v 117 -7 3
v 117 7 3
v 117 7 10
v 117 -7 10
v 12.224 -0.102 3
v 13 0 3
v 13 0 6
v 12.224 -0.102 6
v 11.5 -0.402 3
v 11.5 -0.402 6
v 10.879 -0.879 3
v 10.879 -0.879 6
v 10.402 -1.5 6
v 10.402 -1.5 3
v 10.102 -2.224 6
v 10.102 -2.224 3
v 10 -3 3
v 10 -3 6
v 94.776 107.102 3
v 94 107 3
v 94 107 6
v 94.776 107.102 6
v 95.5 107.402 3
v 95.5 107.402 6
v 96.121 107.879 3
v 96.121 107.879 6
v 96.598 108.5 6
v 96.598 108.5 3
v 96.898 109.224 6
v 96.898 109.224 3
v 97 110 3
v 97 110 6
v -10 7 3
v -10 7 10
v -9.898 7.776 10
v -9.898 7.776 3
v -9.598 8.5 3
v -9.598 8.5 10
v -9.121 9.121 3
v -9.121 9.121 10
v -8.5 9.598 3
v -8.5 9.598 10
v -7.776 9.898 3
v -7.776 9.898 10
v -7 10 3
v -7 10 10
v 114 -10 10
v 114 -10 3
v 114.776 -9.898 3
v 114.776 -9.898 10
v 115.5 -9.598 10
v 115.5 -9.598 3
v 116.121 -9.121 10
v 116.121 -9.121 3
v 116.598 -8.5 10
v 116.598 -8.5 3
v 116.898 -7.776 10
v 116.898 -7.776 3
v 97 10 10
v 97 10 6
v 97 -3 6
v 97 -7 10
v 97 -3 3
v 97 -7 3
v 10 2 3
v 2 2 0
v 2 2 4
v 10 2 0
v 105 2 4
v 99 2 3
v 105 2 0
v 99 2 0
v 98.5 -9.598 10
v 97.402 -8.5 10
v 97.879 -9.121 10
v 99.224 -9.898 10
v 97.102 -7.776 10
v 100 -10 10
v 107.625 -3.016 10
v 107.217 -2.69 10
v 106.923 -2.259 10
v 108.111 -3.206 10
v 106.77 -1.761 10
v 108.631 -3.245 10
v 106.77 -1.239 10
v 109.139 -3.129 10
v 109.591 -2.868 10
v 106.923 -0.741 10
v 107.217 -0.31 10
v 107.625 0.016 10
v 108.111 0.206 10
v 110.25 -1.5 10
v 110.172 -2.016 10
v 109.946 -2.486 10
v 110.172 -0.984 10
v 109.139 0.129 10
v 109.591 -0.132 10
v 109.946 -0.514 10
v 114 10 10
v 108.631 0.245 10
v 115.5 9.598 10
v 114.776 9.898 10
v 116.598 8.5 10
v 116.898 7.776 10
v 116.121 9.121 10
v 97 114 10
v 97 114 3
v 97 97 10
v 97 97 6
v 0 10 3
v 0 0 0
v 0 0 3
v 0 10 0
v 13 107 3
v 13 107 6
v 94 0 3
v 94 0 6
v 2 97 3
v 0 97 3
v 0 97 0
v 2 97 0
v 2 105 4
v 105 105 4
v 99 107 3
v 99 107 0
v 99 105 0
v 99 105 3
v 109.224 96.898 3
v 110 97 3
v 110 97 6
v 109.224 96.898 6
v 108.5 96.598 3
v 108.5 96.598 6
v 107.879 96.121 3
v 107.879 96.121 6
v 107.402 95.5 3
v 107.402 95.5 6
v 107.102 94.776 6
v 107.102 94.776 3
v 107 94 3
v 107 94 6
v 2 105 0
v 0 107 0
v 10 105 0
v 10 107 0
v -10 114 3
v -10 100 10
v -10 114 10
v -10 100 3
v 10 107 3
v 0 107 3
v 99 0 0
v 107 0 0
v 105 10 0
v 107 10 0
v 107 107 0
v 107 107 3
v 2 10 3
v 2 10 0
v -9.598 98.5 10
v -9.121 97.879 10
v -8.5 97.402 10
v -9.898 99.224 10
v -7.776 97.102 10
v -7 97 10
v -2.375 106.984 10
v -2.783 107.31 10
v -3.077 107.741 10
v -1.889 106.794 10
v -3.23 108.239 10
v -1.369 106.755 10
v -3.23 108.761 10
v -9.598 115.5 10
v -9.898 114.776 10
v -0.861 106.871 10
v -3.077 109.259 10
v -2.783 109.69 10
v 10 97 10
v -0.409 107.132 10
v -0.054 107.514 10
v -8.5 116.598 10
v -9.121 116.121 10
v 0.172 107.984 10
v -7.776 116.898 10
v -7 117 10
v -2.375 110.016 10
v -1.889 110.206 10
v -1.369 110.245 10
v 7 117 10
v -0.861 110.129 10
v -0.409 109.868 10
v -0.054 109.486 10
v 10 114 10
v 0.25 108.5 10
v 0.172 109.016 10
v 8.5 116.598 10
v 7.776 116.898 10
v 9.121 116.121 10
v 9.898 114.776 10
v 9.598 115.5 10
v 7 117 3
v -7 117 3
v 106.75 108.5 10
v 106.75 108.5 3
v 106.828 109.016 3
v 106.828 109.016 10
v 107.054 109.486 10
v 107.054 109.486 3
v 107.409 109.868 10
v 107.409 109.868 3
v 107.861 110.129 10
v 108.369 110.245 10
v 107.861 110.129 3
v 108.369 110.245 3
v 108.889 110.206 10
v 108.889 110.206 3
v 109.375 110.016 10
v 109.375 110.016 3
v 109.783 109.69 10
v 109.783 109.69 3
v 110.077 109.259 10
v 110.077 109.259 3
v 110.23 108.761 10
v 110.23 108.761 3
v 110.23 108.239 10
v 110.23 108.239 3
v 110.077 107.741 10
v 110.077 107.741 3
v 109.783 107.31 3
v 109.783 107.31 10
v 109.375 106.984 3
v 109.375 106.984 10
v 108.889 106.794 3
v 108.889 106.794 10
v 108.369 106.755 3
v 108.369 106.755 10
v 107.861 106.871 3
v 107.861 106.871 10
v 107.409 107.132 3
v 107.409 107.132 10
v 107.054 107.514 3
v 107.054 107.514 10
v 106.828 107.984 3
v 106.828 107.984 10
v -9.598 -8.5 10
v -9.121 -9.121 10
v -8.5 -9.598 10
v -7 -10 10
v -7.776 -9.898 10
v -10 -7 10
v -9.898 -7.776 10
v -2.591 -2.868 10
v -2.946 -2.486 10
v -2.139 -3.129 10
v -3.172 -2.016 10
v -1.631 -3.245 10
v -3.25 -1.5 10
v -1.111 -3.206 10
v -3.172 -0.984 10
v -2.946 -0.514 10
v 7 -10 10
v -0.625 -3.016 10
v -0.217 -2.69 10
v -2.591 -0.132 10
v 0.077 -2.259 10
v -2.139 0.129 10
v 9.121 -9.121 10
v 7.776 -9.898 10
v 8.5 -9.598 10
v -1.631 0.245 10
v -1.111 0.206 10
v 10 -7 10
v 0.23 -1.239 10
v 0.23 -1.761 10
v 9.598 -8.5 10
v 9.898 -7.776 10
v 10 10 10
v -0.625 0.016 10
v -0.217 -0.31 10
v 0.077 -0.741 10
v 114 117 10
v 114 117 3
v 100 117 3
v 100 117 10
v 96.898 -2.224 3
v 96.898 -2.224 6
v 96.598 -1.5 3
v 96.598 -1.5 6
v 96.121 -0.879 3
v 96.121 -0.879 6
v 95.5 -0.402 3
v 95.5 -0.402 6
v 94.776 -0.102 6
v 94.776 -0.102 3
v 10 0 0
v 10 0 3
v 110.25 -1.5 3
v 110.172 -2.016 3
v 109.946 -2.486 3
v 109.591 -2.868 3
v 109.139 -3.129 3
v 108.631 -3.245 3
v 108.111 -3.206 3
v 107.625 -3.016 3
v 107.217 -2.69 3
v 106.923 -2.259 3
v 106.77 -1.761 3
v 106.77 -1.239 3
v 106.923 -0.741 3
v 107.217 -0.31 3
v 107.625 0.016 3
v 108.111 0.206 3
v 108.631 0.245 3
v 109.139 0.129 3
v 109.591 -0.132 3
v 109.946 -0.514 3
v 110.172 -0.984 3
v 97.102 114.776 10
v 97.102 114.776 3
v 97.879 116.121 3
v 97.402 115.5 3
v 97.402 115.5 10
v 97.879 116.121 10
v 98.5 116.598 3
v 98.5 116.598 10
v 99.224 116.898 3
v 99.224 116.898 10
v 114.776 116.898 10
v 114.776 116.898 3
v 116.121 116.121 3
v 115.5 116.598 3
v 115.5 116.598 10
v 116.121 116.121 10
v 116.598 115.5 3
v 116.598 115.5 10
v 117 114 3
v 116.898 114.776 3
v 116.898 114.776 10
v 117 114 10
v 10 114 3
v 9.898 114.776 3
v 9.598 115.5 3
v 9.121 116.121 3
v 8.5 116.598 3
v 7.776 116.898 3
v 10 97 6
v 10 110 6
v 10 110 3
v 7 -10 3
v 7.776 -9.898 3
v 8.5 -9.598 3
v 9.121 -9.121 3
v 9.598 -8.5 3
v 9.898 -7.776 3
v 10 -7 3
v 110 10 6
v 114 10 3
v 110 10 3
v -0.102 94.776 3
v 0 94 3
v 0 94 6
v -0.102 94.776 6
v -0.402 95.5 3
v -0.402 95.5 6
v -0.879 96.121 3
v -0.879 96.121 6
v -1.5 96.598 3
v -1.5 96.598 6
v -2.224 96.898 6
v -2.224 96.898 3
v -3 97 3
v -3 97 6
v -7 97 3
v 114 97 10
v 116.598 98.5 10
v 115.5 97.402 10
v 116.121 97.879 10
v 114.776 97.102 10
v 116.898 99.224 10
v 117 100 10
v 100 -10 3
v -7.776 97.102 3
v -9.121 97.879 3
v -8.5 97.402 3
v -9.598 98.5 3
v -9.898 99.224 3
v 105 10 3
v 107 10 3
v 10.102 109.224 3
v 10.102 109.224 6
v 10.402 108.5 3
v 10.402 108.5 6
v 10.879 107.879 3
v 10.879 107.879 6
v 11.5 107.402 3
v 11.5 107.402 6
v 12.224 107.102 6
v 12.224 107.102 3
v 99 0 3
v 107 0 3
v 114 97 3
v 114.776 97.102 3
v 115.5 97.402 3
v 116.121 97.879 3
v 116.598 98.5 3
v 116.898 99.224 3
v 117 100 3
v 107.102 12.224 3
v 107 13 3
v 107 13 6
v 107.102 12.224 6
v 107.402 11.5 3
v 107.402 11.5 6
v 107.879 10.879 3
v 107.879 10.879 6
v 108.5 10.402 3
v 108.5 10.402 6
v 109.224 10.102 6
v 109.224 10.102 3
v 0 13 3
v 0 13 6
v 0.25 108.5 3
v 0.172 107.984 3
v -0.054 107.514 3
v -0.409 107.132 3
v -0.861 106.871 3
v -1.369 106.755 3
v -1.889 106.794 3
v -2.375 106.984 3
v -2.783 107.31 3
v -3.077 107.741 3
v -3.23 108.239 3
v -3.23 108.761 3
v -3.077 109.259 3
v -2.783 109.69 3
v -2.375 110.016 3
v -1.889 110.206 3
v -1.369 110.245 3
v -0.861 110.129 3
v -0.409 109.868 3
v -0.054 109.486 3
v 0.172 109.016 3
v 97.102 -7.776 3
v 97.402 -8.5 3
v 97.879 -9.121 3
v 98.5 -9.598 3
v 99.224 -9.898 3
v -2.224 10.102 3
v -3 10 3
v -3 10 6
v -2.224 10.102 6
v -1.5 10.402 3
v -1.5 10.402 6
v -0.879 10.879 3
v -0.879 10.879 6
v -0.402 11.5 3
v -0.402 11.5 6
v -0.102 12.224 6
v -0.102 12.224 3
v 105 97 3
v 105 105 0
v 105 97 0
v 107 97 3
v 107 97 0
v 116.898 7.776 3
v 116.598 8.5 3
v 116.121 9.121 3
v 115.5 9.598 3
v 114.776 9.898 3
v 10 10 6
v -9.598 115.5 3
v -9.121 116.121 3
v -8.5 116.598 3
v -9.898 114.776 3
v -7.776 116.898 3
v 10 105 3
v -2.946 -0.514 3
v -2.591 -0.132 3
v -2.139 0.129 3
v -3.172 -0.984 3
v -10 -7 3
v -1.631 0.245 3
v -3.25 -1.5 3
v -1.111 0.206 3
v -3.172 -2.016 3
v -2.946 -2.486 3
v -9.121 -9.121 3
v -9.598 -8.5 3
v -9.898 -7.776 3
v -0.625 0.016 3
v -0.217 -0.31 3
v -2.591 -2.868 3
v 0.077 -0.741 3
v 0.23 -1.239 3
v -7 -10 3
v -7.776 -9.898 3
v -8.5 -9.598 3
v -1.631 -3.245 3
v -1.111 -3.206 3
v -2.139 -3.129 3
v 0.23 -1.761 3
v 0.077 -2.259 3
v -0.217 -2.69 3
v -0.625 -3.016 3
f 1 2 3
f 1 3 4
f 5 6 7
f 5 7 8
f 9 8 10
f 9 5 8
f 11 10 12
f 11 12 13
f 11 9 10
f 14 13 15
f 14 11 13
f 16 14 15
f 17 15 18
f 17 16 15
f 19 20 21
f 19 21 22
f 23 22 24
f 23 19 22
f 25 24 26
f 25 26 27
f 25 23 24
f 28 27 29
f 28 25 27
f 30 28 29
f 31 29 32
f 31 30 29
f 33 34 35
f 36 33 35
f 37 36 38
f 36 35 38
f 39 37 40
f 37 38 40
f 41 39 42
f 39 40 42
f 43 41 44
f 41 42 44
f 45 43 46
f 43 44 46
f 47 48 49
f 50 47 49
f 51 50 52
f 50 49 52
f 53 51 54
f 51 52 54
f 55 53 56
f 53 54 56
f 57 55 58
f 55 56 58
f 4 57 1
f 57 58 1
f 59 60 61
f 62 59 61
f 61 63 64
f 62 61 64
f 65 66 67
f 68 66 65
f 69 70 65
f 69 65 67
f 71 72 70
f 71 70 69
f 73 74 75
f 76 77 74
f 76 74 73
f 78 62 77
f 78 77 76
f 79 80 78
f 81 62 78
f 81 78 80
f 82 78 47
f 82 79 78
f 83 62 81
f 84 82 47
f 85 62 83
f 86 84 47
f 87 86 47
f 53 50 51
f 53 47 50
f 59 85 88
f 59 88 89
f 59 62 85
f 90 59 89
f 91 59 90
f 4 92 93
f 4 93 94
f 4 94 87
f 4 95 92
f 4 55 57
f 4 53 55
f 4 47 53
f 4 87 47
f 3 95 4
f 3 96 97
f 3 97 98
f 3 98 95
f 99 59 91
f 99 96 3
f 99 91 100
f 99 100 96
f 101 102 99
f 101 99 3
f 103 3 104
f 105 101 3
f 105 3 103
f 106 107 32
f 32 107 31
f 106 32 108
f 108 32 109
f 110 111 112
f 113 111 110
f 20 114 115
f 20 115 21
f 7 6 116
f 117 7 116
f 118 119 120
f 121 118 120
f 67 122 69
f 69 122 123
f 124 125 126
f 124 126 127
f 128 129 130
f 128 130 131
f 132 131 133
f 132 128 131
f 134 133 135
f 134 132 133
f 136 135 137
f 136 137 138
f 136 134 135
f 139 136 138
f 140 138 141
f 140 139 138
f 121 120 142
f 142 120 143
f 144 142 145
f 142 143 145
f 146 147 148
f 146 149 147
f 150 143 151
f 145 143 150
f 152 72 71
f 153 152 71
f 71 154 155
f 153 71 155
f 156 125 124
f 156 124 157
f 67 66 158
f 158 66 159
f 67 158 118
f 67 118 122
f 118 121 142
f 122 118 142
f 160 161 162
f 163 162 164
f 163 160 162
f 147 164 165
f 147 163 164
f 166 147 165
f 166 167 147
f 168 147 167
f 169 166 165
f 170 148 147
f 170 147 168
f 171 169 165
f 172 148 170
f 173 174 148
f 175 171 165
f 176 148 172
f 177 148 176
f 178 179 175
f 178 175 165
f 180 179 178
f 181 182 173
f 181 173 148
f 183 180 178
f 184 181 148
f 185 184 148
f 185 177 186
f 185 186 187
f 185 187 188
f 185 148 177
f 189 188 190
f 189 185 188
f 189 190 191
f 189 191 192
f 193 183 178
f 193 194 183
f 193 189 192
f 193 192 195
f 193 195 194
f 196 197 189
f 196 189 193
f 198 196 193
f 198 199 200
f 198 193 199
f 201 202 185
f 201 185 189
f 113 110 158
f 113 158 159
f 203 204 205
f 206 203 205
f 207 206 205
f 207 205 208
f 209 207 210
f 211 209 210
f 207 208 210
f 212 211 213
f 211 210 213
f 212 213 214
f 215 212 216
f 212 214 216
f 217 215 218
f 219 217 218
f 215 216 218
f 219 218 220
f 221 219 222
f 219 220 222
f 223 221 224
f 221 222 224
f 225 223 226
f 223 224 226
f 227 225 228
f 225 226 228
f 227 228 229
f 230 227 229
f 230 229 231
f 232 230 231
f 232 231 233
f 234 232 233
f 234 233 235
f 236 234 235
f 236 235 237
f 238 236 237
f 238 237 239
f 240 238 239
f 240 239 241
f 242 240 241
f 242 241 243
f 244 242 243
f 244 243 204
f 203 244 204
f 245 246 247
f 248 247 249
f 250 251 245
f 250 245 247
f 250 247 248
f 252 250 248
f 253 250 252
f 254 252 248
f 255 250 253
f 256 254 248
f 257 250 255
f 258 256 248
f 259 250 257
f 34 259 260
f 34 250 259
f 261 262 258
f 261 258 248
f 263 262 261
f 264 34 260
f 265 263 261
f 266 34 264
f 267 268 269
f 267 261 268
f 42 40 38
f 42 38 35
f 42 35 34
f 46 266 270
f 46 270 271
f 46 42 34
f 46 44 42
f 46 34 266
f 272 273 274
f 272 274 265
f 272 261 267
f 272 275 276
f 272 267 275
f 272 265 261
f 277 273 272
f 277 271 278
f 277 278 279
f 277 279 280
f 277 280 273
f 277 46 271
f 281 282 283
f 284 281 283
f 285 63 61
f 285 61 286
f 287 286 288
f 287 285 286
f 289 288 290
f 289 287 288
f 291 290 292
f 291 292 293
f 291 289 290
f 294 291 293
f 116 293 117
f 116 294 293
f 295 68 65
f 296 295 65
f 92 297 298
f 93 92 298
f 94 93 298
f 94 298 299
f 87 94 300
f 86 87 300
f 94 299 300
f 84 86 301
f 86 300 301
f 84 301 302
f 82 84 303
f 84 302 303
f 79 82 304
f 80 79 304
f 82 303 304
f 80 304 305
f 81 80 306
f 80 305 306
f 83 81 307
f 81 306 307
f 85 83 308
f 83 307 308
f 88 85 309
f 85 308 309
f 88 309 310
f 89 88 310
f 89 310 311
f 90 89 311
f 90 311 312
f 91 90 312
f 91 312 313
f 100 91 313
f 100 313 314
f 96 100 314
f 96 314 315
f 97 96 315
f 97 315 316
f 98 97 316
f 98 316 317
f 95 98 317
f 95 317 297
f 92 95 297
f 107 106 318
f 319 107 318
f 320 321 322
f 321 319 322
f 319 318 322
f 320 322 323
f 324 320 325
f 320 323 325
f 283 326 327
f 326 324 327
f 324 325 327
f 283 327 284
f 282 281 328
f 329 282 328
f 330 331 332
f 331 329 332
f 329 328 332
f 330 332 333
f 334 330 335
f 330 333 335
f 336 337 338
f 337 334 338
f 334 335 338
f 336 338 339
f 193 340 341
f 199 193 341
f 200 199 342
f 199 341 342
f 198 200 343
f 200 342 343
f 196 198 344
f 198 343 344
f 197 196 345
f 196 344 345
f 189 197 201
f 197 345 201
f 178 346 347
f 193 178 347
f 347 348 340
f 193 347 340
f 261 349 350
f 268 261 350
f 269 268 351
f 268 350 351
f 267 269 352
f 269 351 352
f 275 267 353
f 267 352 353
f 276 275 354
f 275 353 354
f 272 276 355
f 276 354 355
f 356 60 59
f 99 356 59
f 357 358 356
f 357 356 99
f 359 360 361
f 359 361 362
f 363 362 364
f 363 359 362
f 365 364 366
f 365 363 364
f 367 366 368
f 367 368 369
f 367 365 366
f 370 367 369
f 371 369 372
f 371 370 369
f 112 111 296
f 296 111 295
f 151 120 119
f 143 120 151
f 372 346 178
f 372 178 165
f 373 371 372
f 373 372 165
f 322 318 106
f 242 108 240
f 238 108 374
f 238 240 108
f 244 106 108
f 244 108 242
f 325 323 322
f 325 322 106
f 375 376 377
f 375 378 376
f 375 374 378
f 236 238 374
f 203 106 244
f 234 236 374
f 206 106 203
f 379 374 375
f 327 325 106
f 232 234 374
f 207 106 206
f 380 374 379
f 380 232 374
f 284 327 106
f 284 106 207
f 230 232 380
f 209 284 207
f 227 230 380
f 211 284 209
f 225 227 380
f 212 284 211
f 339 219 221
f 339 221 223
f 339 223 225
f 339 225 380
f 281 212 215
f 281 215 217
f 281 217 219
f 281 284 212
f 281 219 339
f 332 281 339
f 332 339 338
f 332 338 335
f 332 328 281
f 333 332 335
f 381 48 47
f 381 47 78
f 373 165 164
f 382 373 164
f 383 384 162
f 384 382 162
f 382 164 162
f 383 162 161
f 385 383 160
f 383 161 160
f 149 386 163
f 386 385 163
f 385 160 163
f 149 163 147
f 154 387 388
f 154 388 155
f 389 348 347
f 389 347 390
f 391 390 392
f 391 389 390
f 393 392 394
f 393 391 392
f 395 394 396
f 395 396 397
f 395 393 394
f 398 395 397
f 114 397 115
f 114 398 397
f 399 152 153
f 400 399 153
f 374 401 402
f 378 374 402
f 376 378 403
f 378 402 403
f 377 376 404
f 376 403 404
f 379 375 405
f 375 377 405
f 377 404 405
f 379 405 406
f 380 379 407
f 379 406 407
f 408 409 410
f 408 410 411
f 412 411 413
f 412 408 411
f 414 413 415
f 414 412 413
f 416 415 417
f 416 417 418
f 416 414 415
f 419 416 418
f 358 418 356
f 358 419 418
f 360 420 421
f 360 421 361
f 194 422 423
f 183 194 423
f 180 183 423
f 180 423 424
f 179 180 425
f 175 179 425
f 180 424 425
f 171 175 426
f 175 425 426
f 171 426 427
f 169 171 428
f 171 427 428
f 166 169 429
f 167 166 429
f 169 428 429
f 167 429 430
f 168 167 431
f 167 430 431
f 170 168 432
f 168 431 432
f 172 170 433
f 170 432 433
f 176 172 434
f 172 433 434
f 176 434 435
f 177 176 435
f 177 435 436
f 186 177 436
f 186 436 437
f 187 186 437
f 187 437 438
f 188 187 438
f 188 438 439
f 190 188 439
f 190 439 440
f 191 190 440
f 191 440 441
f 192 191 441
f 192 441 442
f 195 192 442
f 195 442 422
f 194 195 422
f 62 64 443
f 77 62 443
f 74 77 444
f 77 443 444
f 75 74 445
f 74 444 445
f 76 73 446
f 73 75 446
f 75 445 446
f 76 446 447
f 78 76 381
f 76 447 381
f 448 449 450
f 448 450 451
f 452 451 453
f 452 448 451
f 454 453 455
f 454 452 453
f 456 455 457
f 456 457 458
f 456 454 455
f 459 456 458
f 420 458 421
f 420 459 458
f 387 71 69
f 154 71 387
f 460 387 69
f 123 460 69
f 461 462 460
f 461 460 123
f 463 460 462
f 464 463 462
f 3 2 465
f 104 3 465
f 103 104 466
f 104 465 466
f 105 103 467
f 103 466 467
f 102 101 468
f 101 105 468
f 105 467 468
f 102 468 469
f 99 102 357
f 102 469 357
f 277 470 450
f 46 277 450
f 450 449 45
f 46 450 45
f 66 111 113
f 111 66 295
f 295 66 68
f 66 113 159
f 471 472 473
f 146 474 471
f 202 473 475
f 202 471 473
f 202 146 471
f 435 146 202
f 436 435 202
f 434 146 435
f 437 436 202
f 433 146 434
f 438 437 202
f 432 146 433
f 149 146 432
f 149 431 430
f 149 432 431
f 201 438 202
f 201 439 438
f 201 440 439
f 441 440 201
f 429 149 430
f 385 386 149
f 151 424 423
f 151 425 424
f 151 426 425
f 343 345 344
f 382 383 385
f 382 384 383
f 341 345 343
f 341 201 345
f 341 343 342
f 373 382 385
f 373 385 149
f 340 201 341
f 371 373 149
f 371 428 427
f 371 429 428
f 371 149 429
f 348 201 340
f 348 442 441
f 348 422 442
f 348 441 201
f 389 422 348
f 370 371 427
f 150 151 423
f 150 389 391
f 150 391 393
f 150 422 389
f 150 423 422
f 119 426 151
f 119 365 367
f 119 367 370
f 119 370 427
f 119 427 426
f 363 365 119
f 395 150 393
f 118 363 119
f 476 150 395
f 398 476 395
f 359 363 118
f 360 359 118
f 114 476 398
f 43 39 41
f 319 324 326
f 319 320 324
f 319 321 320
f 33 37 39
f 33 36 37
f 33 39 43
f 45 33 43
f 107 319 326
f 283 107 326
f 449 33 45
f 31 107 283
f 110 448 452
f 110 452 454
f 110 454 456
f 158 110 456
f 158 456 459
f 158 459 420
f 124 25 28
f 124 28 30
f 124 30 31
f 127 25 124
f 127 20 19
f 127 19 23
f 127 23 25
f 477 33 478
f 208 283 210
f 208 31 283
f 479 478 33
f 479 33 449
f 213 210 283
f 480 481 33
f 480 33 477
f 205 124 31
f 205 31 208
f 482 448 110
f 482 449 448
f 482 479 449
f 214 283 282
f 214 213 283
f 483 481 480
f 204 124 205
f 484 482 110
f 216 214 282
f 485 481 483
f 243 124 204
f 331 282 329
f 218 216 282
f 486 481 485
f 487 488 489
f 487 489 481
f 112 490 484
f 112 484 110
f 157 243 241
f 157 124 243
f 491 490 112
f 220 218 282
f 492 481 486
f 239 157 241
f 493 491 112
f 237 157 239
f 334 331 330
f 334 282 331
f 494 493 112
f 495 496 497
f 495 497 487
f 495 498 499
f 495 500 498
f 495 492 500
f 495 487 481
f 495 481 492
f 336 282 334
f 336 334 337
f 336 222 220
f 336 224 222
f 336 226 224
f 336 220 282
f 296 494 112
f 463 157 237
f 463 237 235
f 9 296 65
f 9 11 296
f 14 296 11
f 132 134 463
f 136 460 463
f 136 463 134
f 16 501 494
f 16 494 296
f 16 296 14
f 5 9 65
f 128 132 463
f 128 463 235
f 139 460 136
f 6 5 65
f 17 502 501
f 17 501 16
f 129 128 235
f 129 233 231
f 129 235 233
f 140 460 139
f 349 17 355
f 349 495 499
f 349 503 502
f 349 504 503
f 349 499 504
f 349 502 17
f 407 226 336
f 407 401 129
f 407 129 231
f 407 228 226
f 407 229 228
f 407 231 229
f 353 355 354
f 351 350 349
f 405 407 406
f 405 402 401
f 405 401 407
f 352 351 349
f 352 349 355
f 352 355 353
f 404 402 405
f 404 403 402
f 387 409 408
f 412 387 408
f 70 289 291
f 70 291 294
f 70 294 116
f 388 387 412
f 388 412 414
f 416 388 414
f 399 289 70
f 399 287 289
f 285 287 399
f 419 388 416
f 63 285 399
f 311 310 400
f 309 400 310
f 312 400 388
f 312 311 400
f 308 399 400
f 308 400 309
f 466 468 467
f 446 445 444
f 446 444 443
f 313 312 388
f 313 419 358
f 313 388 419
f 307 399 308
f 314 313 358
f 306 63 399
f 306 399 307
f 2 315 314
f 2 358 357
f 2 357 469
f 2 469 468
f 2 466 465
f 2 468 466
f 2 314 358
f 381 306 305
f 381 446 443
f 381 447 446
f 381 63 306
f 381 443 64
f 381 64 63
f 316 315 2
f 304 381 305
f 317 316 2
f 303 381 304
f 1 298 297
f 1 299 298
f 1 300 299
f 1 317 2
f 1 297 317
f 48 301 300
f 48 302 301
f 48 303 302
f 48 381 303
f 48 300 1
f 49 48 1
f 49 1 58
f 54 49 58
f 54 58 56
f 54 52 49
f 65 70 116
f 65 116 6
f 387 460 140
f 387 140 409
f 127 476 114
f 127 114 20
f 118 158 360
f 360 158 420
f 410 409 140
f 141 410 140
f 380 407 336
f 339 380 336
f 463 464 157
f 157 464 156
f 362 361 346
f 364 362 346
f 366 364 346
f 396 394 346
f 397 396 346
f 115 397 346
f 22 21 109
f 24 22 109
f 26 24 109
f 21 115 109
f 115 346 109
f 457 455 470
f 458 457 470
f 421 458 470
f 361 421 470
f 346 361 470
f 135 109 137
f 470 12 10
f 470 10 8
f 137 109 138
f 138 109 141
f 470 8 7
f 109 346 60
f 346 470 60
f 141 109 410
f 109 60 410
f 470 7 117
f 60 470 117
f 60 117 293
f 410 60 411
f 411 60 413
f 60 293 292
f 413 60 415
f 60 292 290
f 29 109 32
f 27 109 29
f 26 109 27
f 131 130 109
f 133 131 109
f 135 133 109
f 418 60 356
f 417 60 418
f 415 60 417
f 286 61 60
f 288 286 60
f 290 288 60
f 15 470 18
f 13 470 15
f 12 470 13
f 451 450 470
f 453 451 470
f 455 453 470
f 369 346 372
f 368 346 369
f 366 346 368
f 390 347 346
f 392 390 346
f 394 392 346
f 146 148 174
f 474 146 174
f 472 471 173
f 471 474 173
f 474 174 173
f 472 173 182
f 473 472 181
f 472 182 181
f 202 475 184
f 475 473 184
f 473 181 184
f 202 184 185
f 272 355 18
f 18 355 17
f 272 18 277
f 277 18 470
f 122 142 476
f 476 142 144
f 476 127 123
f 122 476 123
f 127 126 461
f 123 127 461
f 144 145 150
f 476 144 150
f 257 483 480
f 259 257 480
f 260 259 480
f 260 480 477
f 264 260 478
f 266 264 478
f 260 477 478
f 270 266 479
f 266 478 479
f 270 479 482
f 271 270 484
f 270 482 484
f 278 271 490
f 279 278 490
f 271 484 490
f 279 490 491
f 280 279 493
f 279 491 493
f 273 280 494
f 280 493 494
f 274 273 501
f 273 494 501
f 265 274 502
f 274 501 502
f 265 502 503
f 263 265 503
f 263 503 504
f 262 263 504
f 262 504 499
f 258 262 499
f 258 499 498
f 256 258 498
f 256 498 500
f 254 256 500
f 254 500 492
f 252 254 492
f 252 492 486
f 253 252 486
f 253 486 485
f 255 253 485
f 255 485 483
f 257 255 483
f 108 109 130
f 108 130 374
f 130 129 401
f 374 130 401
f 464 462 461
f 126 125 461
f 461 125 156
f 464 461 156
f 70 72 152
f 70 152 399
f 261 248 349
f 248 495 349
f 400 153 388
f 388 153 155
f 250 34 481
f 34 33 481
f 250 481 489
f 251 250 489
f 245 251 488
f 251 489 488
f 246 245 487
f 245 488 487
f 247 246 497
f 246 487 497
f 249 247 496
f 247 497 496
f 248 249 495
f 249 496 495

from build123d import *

# Parameters (mm, degrees)
SKETCH1_W               = 107
SKETCH1_H               = 107
BOSS_EXTRUDE1_DEPTH     = 6
SHELL6_T                = -2
CUT_EXTRUDE1_DEPTH      = 151.03332963
CUT_EXTRUDE1_DEPTH_BACK = 105
SKETCH2_W               = 89
SKETCH2_H               = 3
CUT_EXTRUDE2_DEPTH      = 152.439756999
CUT_EXTRUDE2_DEPTH_BACK = 152.439756999
SKETCH3_W               = 4.823716506
SKETCH3_H               = 87
SKETCH4_R               = 1.75
BOSS_EXTRUDE2_DEPTH     = 7
BOSS_EXTRUDE3_START     = 3
SKETCH5_R               = 1.75
BOSS_EXTRUDE3_DEPTH     = 3
SKETCH6_W               = 127
SKETCH6_H               = 127
CUT_EXTRUDE3_DEPTH      = 3
FILLET2_R               = 3


with BuildPart() as part:
    # Sketch1 → Boss-Extrude1 (new body)
    with BuildSketch(Plane.XY):
        with Locations((53.5, 53.5)):
            Rectangle(SKETCH1_W, SKETCH1_H)
    extrude(amount=BOSS_EXTRUDE1_DEPTH)

    # Shell6
    shell6_openings = [part.faces().sort_by_distance(p)[0] for p in [
        (53.5, 53.5, 0),
    ]]
    offset(amount=SHELL6_T, openings=shell6_openings, kind=Kind.INTERSECTION)

    # Sketch2 → Cut-Extrude1 (cut, two sides: drawn at the far end of the back side and taken through both)
    with BuildSketch(Plane.XZ.offset(-105).offset(-CUT_EXTRUDE1_DEPTH_BACK)):
        with Locations((54.5, 1.5)):
            Rectangle(SKETCH2_W, SKETCH2_H)
    extrude(amount=CUT_EXTRUDE1_DEPTH + CUT_EXTRUDE1_DEPTH_BACK, mode=Mode.SUBTRACT)

    # Sketch3 → Cut-Extrude2 (cut, two sides: drawn at the far end of the back side and taken through both)
    with BuildSketch(Plane(origin=(107, 0, 0), x_dir=(0, 0, -1), z_dir=(1, 0, 0)).offset(-CUT_EXTRUDE2_DEPTH_BACK)):
        with Locations((-0.588141747, 53.5)):
            Rectangle(SKETCH3_W, SKETCH3_H)
    extrude(amount=CUT_EXTRUDE2_DEPTH + CUT_EXTRUDE2_DEPTH_BACK, mode=Mode.SUBTRACT)

    # Sketch4 → Boss-Extrude2 (add)
    # profile 1 of 4: a face of its own
    with BuildSketch(Plane.XY.offset(6)):
        Polygon((10, 107), (10, 97), (-10, 97), (-10, 117), (10, 117), align=None)
        with Locations((-1.5, 108.5)):
            Circle(SKETCH4_R, mode=Mode.SUBTRACT)
    # profile 2 of 4: a face of its own
    with BuildSketch(Plane.XY.offset(6)):
        Polygon((97, 97), (117, 97), (117, 117), (97, 117), (97, 107), align=None)
        with Locations(Location((108.5, 108.5, 0), (0, 0, 180))):
            Circle(SKETCH4_R, mode=Mode.SUBTRACT)
    # profile 3 of 4: a face of its own
    with BuildSketch(Plane.XY.offset(6)):
        Polygon((117, -10), (97, -10), (97, 0), (97, 10), (117, 10), align=None)
        with Locations((108.5, -1.5)):
            Circle(SKETCH4_R, mode=Mode.SUBTRACT)
    # profile 4 of 4: a face of its own
    with BuildSketch(Plane.XY.offset(6)):
        Polygon((10, 0), (10, 10), (-10, 10), (-10, -10), (10, -10), align=None)
        with Locations(Location((-1.5, -1.5, 0), (0, 0, 180))):
            Circle(SKETCH4_R, mode=Mode.SUBTRACT)
    extrude(amount=BOSS_EXTRUDE2_DEPTH)

    # Sketch5 → Boss-Extrude3 (add)
    # profile 1 of 4: a face of its own
    with BuildSketch(Plane(origin=(0, 0, 6), x_dir=(-1, 0, 0), z_dir=(0, 0, -1)).offset(BOSS_EXTRUDE3_START)):
        Polygon((-107, 97), (-117, 97), (-117, 117), (-97, 117), (-97, 107), (-107, 107), align=None)
        with Locations((-108.5, 108.5)):
            Circle(SKETCH5_R, mode=Mode.SUBTRACT)
    # profile 2 of 4: a face of its own
    with BuildSketch(Plane(origin=(0, 0, 6), x_dir=(-1, 0, 0), z_dir=(0, 0, -1)).offset(BOSS_EXTRUDE3_START)):
        Polygon((10, 97), (10, 117), (-10, 117), (-10, 107), (0, 107), (0, 97), align=None)
        with Locations(Location((1.5, 108.5, 0), (0, 0, 180))):
            Circle(SKETCH5_R, mode=Mode.SUBTRACT)
    # profile 3 of 4: a face of its own
    with BuildSketch(Plane(origin=(0, 0, 6), x_dir=(-1, 0, 0), z_dir=(0, 0, -1)).offset(BOSS_EXTRUDE3_START)):
        Polygon((10, 10), (10, -10), (-10, -10), (-10, 0), (0, 0), (0, 10), align=None)
        with Locations((1.5, -1.5)):
            Circle(SKETCH5_R, mode=Mode.SUBTRACT)
    # profile 4 of 4: a face of its own
    with BuildSketch(Plane(origin=(0, 0, 6), x_dir=(-1, 0, 0), z_dir=(0, 0, -1)).offset(BOSS_EXTRUDE3_START)):
        Polygon((-117, 10), (-117, -10), (-97, -10), (-97, 0), (-107, 0), (-107, 10), align=None)
        with Locations(Location((-108.5, -1.5, 0), (0, 0, 180))):
            Circle(SKETCH5_R, mode=Mode.SUBTRACT)
    extrude(amount=-BOSS_EXTRUDE3_DEPTH)

    # Sketch6 → Cut-Extrude3 (cut)
    with BuildSketch(Plane.XY.offset(13)):
        with Locations((53.5, 53.5)):
            Rectangle(SKETCH6_W, SKETCH6_H)
    extrude(amount=-CUT_EXTRUDE3_DEPTH, mode=Mode.SUBTRACT)

    # Fillet2
    # the kernel refuses this fillet: 3 mm, written as the material it adds along each edge
    with BuildSketch(Plane(origin=(107, 97, 3), x_dir=(0, -1, 0), z_dir=(0, 0, 1)), Plane(origin=(0, 97, 3), x_dir=(-1, 0, 0), z_dir=(0, 0, 1)), Plane(origin=(10, 107, 3), x_dir=(1, 0, 0), z_dir=(0, 0, 1)), Plane(origin=(0, 10, 3), x_dir=(0, 1, 0), z_dir=(0, 0, 1)), Plane(origin=(107, 10, 3), x_dir=(1, 0, 0), z_dir=(0, 0, 1)), Plane(origin=(97, 0, 3), x_dir=(-1, 0, 0), z_dir=(0, 0, 1))) as fillet2_piece_1:
        with BuildLine():
            CenterArc((FILLET2_R, FILLET2_R), FILLET2_R, 180, 90)
            Line((0, FILLET2_R), (0, 0))
            Line((0, 0), (FILLET2_R, 0))
        make_face()
    extrude(amount=3)
    with BuildSketch(Plane(origin=(97, 107, 3), x_dir=(-1, 0, 0), z_dir=(0, 0, 1)), Plane(origin=(10, 0, 3), x_dir=(1, 0, 0), z_dir=(0, 0, 1))) as fillet2_piece_2:
        with BuildLine():
            CenterArc((FILLET2_R, -FILLET2_R), FILLET2_R, 90, 90)
            Line((0, -FILLET2_R), (0, 0))
            Line((0, 0), (FILLET2_R, 0))
        make_face()
    extrude(amount=3)
    # the kernel refuses this fillet: 3 mm, written as the material it takes off along each edge
    with BuildSketch(Plane(origin=(-10, -10, -4.5), x_dir=(1, 0, 0), z_dir=(0, 0, 1)), Plane(origin=(10, -10, -4.5), x_dir=(0, 1, 0), z_dir=(0, 0, 1)), Plane(origin=(-10, 10, 17.5), x_dir=(1, 0, 0), z_dir=(0, 0, -1)), Plane(origin=(97, -10, -4.5), x_dir=(1, 0, 0), z_dir=(0, 0, 1)), Plane(origin=(117, -10, -4.5), x_dir=(0, 1, 0), z_dir=(0, 0, 1)), Plane(origin=(117, 10, -4.5), x_dir=(-1, 0, 0), z_dir=(0, 0, 1)), Plane(origin=(117, 97, -4.5), x_dir=(0, 1, 0), z_dir=(0, 0, 1)), Plane(origin=(10, 117, -4.5), x_dir=(-1, 0, 0), z_dir=(0, 0, 1))) as fillet2_2_piece_1:
        with BuildLine():
            CenterArc((FILLET2_R, FILLET2_R), FILLET2_R, 180, 90)
            Line((0, FILLET2_R), (0, 0))
            Line((0, 0), (FILLET2_R, 0))
        make_face()
    extrude(amount=22, mode=Mode.SUBTRACT)
    with BuildSketch(Plane(origin=(97, 117, 17.5), x_dir=(0, -1, 0), z_dir=(0, 0, -1)), Plane(origin=(117, 117, 17.5), x_dir=(-1, 0, 0), z_dir=(0, 0, -1)), Plane(origin=(-10, 97, 17.5), x_dir=(1, 0, 0), z_dir=(0, 0, -1)), Plane(origin=(-10, 117, 17.5), x_dir=(0, -1, 0), z_dir=(0, 0, -1))) as fillet2_2_piece_2:
        with BuildLine():
            CenterArc((FILLET2_R, -FILLET2_R), FILLET2_R, 90, 90)
            Line((0, -FILLET2_R), (0, 0))
            Line((0, 0), (FILLET2_R, 0))
        make_face()
    extrude(amount=22, mode=Mode.SUBTRACT)


solid = part.part
